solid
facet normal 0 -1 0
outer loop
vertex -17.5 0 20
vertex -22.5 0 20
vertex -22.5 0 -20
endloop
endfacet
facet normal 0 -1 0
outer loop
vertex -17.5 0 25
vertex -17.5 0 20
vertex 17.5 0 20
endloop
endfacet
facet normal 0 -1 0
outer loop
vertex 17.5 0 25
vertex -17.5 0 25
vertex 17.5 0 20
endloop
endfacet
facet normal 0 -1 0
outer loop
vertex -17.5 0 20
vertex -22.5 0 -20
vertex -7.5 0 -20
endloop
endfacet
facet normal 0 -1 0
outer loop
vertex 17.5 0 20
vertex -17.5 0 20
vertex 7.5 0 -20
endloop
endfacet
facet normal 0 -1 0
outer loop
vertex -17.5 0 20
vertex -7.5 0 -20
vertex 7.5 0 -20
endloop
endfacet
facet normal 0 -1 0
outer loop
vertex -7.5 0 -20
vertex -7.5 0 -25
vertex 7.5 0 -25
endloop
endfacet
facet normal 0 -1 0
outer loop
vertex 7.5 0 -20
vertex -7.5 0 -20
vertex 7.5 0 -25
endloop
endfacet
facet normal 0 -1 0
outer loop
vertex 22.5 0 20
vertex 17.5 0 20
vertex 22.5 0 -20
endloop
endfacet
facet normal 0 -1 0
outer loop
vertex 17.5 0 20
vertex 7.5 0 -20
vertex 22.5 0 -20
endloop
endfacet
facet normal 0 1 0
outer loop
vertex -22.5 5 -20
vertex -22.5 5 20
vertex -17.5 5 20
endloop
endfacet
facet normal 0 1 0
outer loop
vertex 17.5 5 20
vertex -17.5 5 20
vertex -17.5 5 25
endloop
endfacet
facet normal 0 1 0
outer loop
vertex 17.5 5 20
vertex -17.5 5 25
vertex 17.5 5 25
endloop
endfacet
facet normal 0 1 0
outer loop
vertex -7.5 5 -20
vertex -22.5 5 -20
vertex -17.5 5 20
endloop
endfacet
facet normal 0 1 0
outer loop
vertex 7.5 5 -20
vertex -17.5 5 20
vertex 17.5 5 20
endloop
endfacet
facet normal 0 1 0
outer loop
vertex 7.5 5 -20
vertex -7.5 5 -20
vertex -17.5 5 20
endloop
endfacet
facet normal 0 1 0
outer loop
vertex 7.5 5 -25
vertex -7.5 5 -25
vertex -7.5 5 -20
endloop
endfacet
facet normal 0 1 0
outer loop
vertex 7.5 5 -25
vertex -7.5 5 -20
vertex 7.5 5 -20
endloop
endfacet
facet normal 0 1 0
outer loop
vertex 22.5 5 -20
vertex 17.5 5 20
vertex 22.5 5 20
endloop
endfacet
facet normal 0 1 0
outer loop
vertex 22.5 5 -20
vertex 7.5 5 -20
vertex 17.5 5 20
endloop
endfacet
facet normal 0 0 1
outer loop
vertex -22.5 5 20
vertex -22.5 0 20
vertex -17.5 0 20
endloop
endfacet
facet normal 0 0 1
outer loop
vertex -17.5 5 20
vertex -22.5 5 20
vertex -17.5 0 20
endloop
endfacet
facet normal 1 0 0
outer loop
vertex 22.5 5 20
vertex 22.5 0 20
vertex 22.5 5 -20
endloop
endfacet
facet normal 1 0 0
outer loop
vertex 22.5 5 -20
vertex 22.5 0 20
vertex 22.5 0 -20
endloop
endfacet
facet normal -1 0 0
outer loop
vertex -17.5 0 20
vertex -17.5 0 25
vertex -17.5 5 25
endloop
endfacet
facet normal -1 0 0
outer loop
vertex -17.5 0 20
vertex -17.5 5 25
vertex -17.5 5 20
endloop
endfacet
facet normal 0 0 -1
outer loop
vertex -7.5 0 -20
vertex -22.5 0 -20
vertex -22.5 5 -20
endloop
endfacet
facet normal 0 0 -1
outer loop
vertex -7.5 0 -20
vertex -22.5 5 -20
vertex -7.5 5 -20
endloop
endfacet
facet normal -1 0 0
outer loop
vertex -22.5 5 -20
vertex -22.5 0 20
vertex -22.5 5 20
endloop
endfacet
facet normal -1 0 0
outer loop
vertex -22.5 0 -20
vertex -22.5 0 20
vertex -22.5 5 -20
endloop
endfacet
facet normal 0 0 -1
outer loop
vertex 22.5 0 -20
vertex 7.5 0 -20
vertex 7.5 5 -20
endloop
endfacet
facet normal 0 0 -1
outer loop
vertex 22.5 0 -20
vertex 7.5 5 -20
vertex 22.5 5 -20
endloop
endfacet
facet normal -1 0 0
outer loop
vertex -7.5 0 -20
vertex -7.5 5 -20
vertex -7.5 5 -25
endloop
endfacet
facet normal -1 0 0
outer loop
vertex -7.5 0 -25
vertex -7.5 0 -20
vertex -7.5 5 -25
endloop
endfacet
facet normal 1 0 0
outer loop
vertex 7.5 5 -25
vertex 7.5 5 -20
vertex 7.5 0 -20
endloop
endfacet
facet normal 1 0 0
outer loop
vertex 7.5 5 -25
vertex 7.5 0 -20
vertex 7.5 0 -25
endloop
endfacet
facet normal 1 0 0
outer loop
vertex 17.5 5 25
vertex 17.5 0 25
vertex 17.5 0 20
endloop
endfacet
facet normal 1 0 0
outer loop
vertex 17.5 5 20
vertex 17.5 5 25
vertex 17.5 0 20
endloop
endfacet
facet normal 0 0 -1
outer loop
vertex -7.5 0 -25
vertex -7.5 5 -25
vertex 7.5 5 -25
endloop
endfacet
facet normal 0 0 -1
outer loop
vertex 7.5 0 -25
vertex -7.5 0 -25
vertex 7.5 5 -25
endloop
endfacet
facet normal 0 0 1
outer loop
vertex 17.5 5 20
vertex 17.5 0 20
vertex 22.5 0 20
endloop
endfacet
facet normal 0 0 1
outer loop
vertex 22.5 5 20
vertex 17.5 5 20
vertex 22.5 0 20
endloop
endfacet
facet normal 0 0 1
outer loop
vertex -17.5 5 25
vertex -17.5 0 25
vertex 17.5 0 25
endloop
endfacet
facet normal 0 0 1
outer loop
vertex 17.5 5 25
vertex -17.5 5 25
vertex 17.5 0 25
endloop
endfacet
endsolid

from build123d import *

# Parameters (mm, degrees)
SKETCH_1_W      = 45
SKETCH_1_H      = 40
SKETCH_1_W_2    = 35
SKETCH_1_H_2    = 5
EXTRUDE_1_DEPTH = 5
SKETCH_2_W      = 15
SKETCH_2_H      = 5
EXTRUDE_2_DEPTH = 5


with BuildPart() as part:
    # 草图1 → 凸台-拉伸1 (new body)
    with BuildSketch(Plane(origin=(0, 0, 0), x_dir=(1, 0, 0), z_dir=(0, 1, 0))):
        Rectangle(SKETCH_1_W, SKETCH_1_H)
        with Locations((0, -22.5)):
            Rectangle(SKETCH_1_W_2, SKETCH_1_H_2)
    extrude(amount=EXTRUDE_1_DEPTH)

    # 草图2 → 凸台-拉伸2 (add)
    with BuildSketch(Plane(origin=(0, 5, 0), x_dir=(1, 0, 0), z_dir=(0, 1, 0))):
        with Locations((0, 22.5)):
            Rectangle(SKETCH_2_W, SKETCH_2_H)
    extrude(amount=-EXTRUDE_2_DEPTH)


solid = part.part
